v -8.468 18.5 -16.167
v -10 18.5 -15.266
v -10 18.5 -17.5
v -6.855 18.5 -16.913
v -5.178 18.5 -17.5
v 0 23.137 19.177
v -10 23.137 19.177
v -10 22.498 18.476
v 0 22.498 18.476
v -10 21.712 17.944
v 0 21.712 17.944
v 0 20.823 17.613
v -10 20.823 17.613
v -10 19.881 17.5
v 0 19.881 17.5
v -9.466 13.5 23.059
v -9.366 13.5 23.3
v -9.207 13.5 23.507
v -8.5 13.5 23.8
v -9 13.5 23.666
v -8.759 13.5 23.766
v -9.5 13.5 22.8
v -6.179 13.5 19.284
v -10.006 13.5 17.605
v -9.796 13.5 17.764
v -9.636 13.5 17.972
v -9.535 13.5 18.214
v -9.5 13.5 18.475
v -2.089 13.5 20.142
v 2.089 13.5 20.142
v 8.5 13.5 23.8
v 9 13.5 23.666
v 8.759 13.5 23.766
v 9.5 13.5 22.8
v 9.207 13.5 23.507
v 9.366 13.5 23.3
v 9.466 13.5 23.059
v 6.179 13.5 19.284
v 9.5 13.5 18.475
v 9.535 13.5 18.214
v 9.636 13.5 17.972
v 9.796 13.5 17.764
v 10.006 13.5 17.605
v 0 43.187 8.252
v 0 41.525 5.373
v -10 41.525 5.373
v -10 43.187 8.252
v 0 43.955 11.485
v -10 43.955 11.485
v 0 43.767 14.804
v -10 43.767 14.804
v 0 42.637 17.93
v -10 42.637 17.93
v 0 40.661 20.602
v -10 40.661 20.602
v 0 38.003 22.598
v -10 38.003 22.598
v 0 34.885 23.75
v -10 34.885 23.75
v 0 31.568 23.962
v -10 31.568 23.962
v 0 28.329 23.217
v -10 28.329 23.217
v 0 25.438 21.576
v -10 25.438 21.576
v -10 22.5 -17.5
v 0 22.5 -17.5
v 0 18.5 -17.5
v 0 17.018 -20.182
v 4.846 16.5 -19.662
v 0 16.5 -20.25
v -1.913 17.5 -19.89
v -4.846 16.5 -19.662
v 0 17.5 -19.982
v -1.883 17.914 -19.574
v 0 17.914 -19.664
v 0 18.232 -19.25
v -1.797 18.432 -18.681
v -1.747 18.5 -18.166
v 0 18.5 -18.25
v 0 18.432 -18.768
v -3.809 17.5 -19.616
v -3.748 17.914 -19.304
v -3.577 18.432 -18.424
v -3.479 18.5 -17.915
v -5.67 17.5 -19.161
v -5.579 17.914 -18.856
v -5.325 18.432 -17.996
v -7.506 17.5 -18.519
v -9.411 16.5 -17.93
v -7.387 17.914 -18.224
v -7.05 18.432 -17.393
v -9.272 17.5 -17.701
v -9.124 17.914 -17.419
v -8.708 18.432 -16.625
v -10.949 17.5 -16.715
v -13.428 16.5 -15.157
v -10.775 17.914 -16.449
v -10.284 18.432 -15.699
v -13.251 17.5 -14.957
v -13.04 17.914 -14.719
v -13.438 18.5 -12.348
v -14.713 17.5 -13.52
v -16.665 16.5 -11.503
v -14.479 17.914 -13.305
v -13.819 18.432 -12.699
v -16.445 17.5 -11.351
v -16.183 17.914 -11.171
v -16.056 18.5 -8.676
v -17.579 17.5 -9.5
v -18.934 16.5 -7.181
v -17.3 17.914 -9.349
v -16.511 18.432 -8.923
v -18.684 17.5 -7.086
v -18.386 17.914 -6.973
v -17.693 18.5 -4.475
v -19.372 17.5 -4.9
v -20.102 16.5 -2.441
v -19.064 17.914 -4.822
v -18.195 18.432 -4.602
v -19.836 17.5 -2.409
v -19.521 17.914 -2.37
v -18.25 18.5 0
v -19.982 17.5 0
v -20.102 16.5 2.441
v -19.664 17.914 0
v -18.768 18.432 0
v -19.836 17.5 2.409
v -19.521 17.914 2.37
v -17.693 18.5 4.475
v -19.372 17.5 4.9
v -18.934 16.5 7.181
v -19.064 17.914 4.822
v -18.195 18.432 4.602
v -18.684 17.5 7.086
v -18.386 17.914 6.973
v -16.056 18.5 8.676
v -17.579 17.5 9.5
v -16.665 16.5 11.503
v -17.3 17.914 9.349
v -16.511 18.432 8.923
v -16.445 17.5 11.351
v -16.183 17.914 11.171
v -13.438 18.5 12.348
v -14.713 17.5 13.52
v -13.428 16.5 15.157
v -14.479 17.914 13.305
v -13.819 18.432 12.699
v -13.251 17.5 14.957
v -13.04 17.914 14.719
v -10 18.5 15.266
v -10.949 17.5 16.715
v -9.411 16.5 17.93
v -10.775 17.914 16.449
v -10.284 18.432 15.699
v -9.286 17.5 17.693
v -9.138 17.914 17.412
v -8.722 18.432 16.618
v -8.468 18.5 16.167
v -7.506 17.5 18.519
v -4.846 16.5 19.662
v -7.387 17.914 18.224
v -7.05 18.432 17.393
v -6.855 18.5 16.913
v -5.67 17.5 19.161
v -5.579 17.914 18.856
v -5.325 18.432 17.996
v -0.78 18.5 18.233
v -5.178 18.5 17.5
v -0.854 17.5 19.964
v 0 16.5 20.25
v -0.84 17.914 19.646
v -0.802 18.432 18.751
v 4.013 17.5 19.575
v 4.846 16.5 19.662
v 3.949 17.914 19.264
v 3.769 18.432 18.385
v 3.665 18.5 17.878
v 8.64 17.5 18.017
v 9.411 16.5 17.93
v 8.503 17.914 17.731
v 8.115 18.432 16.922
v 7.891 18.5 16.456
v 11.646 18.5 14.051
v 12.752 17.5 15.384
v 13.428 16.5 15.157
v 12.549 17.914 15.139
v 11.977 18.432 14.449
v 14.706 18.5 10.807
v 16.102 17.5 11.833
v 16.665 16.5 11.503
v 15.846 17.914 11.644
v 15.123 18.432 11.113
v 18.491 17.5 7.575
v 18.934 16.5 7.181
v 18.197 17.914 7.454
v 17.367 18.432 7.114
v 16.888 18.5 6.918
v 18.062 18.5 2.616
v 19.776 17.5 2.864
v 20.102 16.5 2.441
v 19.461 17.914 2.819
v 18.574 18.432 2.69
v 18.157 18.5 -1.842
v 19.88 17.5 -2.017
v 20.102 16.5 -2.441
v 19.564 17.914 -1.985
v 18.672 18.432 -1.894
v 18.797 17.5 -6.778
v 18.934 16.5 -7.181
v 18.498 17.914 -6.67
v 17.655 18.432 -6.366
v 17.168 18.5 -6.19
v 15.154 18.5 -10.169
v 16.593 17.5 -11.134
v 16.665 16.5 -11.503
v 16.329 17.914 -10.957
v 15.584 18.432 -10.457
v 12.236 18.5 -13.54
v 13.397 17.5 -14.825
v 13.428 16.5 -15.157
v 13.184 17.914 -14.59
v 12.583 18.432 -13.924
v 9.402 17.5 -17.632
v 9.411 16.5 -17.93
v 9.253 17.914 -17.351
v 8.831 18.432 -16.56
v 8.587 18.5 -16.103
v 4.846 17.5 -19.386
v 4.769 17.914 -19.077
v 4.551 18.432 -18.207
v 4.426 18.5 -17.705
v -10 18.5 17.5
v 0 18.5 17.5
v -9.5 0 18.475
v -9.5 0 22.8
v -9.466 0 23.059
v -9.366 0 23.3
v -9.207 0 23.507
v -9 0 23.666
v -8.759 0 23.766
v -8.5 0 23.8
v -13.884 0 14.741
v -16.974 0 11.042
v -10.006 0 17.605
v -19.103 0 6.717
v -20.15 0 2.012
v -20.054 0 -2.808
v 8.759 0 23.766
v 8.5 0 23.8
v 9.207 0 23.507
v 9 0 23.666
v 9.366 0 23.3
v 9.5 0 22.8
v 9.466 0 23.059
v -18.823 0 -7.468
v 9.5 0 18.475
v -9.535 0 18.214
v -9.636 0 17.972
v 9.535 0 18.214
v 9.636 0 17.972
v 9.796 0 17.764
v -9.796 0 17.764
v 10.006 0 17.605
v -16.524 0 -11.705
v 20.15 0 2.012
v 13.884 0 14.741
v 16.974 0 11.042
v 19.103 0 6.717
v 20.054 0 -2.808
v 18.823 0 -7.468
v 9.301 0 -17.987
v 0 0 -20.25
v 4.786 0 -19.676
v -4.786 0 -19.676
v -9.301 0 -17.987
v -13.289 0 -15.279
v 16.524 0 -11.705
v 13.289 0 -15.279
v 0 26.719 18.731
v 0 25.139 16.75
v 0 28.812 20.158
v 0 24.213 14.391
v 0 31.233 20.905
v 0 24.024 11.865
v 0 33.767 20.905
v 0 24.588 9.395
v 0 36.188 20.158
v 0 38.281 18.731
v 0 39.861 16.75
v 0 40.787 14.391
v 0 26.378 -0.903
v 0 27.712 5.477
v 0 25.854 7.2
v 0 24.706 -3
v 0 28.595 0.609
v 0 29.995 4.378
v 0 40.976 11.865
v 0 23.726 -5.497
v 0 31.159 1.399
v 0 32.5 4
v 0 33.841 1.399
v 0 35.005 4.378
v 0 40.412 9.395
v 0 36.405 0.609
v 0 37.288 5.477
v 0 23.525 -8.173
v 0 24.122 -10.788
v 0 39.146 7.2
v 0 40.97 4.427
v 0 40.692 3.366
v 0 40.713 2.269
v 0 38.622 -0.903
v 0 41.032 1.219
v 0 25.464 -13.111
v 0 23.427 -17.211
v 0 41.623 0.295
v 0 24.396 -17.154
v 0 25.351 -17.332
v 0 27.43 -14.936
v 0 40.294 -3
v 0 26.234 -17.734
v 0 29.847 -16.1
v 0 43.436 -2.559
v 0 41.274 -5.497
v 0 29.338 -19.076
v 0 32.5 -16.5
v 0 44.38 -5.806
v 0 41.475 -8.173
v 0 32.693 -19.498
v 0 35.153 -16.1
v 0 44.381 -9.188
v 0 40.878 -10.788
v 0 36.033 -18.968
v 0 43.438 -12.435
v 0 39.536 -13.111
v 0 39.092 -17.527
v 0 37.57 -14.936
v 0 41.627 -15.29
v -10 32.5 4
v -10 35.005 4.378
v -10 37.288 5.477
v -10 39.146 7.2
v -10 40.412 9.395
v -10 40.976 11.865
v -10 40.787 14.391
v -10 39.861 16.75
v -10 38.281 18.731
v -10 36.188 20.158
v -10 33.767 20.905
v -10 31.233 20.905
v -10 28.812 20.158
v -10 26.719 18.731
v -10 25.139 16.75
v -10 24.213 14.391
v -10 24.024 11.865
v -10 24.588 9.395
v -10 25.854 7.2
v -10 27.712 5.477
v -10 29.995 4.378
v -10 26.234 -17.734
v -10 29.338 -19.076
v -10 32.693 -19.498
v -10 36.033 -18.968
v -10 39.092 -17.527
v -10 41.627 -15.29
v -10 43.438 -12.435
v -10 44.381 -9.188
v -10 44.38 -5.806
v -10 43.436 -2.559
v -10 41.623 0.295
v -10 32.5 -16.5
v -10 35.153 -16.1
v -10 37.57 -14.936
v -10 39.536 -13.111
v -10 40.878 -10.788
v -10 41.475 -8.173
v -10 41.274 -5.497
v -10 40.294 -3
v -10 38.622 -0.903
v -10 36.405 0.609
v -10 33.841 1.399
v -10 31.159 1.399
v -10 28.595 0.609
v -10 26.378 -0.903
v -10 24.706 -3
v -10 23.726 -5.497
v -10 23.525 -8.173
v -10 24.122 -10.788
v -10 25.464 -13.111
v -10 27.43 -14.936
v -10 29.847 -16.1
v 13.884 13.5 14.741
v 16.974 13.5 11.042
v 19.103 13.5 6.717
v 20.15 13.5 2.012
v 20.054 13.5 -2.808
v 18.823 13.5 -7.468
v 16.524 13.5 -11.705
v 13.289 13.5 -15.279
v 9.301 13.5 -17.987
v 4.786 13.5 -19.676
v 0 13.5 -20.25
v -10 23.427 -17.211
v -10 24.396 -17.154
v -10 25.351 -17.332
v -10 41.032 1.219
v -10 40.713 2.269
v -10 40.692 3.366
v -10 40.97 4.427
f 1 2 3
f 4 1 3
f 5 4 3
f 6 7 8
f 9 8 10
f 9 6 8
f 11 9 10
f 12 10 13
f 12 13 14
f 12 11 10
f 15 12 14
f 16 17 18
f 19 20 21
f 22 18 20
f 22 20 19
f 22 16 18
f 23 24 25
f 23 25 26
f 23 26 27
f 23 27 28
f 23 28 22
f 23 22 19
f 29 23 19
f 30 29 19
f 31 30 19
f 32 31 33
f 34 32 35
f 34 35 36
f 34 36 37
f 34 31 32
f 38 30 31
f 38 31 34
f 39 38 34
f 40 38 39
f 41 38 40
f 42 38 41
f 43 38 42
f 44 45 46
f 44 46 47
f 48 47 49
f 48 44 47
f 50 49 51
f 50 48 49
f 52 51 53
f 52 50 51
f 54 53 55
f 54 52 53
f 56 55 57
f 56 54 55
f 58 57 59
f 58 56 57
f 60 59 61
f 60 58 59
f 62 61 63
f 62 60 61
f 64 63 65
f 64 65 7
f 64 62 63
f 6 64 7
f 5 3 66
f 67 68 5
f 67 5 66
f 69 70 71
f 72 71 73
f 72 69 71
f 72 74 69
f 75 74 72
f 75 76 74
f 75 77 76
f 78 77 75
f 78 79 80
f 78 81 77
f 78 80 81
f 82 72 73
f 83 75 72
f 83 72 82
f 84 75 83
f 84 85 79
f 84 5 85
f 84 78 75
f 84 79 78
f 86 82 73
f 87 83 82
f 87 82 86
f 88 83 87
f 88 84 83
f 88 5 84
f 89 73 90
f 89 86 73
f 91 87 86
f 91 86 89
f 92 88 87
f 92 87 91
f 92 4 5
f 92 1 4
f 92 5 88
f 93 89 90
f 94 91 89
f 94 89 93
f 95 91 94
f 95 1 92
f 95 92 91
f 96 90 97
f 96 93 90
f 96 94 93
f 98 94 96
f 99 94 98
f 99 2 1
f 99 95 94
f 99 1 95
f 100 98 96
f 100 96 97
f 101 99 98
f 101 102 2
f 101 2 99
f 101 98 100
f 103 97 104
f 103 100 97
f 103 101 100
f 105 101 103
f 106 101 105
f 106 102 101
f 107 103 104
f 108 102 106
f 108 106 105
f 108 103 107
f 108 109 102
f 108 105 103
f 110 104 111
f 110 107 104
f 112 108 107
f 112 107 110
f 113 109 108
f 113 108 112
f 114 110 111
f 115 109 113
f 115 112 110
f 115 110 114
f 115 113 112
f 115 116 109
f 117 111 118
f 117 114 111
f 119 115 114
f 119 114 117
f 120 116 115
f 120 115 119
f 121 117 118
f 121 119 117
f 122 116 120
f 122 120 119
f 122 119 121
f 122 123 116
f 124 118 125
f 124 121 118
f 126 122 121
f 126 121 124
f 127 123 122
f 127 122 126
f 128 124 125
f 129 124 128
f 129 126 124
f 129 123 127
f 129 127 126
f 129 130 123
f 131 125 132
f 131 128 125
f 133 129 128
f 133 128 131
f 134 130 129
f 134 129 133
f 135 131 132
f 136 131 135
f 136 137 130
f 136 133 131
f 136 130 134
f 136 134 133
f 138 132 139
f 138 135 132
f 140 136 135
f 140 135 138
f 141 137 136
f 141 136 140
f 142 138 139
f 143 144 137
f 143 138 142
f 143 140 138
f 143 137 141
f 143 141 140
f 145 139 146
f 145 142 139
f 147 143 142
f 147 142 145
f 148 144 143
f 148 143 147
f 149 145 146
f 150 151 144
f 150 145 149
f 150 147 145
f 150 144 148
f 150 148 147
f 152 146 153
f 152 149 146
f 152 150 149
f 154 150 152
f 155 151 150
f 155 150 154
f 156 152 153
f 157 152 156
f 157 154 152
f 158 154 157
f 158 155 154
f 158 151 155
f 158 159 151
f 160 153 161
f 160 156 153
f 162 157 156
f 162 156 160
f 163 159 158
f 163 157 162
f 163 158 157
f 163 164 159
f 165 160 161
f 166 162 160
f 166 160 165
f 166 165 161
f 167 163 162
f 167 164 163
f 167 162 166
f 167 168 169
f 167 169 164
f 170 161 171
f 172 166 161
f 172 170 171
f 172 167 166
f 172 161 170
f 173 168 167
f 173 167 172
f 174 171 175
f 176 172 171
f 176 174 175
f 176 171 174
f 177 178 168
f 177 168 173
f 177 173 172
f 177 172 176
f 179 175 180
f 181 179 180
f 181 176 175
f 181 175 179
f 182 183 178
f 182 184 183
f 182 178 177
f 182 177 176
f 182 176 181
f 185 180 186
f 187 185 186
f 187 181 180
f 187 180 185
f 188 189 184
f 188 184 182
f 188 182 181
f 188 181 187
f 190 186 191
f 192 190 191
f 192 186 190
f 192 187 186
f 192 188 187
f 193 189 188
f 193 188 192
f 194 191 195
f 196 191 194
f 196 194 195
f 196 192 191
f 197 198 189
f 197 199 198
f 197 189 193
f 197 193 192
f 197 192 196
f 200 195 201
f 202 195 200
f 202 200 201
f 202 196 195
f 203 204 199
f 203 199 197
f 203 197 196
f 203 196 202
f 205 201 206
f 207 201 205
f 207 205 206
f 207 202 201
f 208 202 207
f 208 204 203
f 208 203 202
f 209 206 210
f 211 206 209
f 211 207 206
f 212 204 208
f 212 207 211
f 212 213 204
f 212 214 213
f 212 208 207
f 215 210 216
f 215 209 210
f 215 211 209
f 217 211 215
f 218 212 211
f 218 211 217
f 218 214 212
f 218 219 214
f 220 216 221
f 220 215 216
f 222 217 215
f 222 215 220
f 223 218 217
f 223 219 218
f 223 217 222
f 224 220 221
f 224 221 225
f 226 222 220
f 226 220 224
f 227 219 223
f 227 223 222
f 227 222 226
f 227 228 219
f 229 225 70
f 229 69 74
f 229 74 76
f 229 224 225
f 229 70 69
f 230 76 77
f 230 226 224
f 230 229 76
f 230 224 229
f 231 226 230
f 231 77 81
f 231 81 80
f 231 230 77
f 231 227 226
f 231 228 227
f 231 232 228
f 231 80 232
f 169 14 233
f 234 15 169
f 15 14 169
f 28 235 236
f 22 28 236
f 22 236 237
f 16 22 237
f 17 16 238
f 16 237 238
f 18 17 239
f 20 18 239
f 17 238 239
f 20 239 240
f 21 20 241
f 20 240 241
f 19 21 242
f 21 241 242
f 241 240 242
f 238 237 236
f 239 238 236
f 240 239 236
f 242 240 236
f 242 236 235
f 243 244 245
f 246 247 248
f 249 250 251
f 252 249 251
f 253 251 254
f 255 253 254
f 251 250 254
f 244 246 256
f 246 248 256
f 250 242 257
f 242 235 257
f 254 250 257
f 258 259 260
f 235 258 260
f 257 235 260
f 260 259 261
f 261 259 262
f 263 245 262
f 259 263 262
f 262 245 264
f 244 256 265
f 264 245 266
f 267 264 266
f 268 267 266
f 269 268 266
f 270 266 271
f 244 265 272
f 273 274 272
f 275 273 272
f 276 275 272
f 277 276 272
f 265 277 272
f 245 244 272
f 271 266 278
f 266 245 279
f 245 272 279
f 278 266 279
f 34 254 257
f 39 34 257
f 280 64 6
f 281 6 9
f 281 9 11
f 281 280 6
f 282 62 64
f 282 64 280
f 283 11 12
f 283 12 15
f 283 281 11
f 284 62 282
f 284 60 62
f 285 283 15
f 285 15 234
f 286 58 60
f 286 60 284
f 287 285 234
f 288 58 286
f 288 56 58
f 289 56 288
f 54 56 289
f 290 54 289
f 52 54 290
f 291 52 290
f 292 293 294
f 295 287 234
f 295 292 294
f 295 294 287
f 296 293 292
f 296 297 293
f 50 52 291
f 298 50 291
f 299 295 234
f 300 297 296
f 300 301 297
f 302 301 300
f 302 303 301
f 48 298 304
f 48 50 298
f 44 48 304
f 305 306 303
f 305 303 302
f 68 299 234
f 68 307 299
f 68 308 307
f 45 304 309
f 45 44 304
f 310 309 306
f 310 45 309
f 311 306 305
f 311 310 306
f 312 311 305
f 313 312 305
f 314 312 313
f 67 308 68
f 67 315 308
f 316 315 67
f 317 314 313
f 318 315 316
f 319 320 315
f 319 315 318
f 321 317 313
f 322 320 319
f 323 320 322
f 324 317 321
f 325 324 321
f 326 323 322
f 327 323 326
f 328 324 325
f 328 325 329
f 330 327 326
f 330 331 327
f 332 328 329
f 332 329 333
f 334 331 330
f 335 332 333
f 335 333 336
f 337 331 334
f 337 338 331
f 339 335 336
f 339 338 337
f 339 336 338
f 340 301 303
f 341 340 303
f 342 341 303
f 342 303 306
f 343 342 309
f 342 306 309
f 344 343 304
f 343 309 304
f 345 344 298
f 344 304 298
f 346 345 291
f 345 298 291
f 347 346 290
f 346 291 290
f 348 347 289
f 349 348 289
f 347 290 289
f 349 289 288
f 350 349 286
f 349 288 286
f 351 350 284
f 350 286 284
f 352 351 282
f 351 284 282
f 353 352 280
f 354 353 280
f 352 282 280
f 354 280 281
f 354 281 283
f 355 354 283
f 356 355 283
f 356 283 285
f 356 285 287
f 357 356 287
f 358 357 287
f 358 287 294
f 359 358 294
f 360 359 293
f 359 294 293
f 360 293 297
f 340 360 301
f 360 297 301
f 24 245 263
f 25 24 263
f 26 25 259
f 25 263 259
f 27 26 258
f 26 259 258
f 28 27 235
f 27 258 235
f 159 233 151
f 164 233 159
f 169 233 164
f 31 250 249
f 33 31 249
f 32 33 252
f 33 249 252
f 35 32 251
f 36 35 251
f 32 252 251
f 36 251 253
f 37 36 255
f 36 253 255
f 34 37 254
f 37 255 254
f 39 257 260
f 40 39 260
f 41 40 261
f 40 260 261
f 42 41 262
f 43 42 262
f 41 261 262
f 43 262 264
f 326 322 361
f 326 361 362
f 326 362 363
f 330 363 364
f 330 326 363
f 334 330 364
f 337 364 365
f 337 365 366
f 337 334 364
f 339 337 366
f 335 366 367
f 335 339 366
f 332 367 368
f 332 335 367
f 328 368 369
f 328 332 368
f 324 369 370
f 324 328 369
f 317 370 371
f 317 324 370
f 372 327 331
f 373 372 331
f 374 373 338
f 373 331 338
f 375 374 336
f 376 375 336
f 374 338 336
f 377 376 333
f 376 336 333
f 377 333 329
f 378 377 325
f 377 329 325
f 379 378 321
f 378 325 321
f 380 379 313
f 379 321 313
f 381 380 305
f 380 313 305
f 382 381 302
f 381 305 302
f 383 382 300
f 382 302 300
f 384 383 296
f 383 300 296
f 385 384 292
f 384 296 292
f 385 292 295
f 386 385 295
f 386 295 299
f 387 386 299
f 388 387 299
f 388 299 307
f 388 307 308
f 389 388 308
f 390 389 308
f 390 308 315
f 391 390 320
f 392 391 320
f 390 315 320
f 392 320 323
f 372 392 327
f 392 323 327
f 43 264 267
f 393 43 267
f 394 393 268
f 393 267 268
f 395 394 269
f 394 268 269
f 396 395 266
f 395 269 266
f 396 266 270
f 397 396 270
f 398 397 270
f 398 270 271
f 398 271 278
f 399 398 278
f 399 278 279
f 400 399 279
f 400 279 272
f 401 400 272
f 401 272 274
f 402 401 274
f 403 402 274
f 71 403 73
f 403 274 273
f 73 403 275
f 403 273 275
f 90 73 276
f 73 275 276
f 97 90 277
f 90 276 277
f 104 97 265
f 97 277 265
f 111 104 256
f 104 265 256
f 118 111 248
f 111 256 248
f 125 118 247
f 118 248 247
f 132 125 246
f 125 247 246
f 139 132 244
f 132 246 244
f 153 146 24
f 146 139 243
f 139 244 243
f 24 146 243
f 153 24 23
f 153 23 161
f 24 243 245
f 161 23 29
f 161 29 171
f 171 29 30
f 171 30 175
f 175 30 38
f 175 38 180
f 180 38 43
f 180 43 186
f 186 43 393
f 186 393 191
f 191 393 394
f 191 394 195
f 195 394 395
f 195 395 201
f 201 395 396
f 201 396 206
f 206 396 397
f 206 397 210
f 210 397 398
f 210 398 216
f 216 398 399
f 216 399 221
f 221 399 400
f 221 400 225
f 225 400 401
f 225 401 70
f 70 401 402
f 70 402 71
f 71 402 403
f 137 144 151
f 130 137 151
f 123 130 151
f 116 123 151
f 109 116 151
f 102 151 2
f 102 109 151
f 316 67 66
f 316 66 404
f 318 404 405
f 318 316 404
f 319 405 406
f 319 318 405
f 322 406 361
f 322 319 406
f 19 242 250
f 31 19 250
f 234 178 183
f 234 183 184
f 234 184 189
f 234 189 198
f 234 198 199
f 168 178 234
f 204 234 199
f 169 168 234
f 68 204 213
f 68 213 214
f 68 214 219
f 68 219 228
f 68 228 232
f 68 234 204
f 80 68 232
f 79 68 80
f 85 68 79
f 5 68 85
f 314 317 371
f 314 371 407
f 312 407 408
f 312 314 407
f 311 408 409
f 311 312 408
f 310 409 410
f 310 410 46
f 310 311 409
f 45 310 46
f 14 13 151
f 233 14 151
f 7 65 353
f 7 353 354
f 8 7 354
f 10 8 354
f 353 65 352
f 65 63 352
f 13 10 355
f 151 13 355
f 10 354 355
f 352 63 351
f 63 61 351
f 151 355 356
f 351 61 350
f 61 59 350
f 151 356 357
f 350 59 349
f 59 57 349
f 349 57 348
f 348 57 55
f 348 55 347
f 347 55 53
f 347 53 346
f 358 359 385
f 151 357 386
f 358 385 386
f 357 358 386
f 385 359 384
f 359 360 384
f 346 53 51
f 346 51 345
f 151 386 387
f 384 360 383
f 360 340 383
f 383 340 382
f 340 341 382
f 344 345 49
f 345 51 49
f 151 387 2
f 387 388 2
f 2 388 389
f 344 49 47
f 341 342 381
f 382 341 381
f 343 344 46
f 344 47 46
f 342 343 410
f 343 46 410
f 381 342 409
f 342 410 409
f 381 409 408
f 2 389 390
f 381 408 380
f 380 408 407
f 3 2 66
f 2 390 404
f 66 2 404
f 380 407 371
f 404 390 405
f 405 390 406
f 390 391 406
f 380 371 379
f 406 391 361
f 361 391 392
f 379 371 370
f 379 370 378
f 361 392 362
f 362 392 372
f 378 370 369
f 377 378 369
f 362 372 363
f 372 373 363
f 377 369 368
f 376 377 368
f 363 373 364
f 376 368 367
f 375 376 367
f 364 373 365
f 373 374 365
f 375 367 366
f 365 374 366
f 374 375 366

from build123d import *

# Parameters (mm, degrees)
BOSS_EXTRUDE1_DEPTH = 13.5
SKETCH2_R           = 20.25
BOSS_EXTRUDE2_DEPTH = 5
FILLET1_R           = 2
SKETCH3_R           = 9
SKETCH3_R_2         = 8.5
BOSS_EXTRUDE3_DEPTH = 10


with BuildPart() as part:
    # Sketch1 → Boss-Extrude1 (new body)
    with BuildSketch(Plane(origin=(0, 0, 0), x_dir=(1, 0, 0), z_dir=(0, 1, 0))):
        with BuildLine():
            Line((-9.5, -18.474644787), (-9.5, -22.8))
            ThreePointArc((-9.5, -22.8), (-9.207106781, -23.507106781), (-8.5, -23.8))
            Line((-8.5, -23.8), (8.5, -23.8))
            ThreePointArc((8.5, -23.8), (9.207106781, -23.507106781), (9.5, -22.8))
            Line((9.5, -22.8), (9.5, -18.474644787))
            ThreePointArc((9.5, -18.474644787), (9.635674353, -17.97171221), (10.005882353, -17.605249738))
            ThreePointArc((10.005882353, -17.605249738), (0, 20.25), (-10.005882353, -17.605249738))
            ThreePointArc((-10.005882353, -17.605249738), (-9.635674353, -17.97171221), (-9.5, -18.474644787))
        make_face()
    extrude(amount=BOSS_EXTRUDE1_DEPTH)

    # Sketch2 → Boss-Extrude2 (add)
    with BuildSketch(Plane(origin=(0, 13.5, 0), x_dir=(1, 0, 0), z_dir=(0, 1, 0))):
        with Locations(Location((0, 0, 0), (0, 0, 90))):
            Circle(SKETCH2_R)
    extrude(amount=BOSS_EXTRUDE2_DEPTH)

    # Fillet1
    fillet1_edges = [part.edges().sort_by_distance(p)[0] for p in [
        (0, 18.5, 20.25),
    ]]
    fillet(fillet1_edges, radius=FILLET1_R)

    # Sketch3 → Boss-Extrude3 (add)
    with BuildSketch(Plane(origin=(0, 0, 0), x_dir=(0, 0, -1), z_dir=(1, 0, 0))):
        with BuildLine():
            Line((17.5, 18.5), (17.5, 22.5))
            ThreePointArc((17.5, 22.5), (17.153602274, 24.396242961), (17.734313483, 26.234313483))
            ThreePointArc((17.734313483, 26.234313483), (15.290492633, 41.627333923), (-0.2953125, 41.6232178))
            ThreePointArc((-0.2953125, 41.6232178), (-2.816482529, 40.665036752), (-5.372782258, 41.525118684))
            ThreePointArc((-5.372782258, 41.525118684), (-21.696710883, 39.404383313), (-19.177419355, 23.137197494))
            ThreePointArc((-19.177419355, 23.137197494), (-17.943996444, 21.712192415), (-17.5, 19.880570536))
            Line((-17.5, 19.880570536), (-17.5, 18.5))
            Line((-17.5, 18.5), (17.5, 18.5))
        make_face()
        with Locations((7.5, 32.5)):
            Circle(SKETCH3_R, mode=Mode.SUBTRACT)
        with Locations((-12.5, 32.5)):
            Circle(SKETCH3_R_2, mode=Mode.SUBTRACT)
    extrude(amount=-BOSS_EXTRUDE3_DEPTH)


solid = part.part
